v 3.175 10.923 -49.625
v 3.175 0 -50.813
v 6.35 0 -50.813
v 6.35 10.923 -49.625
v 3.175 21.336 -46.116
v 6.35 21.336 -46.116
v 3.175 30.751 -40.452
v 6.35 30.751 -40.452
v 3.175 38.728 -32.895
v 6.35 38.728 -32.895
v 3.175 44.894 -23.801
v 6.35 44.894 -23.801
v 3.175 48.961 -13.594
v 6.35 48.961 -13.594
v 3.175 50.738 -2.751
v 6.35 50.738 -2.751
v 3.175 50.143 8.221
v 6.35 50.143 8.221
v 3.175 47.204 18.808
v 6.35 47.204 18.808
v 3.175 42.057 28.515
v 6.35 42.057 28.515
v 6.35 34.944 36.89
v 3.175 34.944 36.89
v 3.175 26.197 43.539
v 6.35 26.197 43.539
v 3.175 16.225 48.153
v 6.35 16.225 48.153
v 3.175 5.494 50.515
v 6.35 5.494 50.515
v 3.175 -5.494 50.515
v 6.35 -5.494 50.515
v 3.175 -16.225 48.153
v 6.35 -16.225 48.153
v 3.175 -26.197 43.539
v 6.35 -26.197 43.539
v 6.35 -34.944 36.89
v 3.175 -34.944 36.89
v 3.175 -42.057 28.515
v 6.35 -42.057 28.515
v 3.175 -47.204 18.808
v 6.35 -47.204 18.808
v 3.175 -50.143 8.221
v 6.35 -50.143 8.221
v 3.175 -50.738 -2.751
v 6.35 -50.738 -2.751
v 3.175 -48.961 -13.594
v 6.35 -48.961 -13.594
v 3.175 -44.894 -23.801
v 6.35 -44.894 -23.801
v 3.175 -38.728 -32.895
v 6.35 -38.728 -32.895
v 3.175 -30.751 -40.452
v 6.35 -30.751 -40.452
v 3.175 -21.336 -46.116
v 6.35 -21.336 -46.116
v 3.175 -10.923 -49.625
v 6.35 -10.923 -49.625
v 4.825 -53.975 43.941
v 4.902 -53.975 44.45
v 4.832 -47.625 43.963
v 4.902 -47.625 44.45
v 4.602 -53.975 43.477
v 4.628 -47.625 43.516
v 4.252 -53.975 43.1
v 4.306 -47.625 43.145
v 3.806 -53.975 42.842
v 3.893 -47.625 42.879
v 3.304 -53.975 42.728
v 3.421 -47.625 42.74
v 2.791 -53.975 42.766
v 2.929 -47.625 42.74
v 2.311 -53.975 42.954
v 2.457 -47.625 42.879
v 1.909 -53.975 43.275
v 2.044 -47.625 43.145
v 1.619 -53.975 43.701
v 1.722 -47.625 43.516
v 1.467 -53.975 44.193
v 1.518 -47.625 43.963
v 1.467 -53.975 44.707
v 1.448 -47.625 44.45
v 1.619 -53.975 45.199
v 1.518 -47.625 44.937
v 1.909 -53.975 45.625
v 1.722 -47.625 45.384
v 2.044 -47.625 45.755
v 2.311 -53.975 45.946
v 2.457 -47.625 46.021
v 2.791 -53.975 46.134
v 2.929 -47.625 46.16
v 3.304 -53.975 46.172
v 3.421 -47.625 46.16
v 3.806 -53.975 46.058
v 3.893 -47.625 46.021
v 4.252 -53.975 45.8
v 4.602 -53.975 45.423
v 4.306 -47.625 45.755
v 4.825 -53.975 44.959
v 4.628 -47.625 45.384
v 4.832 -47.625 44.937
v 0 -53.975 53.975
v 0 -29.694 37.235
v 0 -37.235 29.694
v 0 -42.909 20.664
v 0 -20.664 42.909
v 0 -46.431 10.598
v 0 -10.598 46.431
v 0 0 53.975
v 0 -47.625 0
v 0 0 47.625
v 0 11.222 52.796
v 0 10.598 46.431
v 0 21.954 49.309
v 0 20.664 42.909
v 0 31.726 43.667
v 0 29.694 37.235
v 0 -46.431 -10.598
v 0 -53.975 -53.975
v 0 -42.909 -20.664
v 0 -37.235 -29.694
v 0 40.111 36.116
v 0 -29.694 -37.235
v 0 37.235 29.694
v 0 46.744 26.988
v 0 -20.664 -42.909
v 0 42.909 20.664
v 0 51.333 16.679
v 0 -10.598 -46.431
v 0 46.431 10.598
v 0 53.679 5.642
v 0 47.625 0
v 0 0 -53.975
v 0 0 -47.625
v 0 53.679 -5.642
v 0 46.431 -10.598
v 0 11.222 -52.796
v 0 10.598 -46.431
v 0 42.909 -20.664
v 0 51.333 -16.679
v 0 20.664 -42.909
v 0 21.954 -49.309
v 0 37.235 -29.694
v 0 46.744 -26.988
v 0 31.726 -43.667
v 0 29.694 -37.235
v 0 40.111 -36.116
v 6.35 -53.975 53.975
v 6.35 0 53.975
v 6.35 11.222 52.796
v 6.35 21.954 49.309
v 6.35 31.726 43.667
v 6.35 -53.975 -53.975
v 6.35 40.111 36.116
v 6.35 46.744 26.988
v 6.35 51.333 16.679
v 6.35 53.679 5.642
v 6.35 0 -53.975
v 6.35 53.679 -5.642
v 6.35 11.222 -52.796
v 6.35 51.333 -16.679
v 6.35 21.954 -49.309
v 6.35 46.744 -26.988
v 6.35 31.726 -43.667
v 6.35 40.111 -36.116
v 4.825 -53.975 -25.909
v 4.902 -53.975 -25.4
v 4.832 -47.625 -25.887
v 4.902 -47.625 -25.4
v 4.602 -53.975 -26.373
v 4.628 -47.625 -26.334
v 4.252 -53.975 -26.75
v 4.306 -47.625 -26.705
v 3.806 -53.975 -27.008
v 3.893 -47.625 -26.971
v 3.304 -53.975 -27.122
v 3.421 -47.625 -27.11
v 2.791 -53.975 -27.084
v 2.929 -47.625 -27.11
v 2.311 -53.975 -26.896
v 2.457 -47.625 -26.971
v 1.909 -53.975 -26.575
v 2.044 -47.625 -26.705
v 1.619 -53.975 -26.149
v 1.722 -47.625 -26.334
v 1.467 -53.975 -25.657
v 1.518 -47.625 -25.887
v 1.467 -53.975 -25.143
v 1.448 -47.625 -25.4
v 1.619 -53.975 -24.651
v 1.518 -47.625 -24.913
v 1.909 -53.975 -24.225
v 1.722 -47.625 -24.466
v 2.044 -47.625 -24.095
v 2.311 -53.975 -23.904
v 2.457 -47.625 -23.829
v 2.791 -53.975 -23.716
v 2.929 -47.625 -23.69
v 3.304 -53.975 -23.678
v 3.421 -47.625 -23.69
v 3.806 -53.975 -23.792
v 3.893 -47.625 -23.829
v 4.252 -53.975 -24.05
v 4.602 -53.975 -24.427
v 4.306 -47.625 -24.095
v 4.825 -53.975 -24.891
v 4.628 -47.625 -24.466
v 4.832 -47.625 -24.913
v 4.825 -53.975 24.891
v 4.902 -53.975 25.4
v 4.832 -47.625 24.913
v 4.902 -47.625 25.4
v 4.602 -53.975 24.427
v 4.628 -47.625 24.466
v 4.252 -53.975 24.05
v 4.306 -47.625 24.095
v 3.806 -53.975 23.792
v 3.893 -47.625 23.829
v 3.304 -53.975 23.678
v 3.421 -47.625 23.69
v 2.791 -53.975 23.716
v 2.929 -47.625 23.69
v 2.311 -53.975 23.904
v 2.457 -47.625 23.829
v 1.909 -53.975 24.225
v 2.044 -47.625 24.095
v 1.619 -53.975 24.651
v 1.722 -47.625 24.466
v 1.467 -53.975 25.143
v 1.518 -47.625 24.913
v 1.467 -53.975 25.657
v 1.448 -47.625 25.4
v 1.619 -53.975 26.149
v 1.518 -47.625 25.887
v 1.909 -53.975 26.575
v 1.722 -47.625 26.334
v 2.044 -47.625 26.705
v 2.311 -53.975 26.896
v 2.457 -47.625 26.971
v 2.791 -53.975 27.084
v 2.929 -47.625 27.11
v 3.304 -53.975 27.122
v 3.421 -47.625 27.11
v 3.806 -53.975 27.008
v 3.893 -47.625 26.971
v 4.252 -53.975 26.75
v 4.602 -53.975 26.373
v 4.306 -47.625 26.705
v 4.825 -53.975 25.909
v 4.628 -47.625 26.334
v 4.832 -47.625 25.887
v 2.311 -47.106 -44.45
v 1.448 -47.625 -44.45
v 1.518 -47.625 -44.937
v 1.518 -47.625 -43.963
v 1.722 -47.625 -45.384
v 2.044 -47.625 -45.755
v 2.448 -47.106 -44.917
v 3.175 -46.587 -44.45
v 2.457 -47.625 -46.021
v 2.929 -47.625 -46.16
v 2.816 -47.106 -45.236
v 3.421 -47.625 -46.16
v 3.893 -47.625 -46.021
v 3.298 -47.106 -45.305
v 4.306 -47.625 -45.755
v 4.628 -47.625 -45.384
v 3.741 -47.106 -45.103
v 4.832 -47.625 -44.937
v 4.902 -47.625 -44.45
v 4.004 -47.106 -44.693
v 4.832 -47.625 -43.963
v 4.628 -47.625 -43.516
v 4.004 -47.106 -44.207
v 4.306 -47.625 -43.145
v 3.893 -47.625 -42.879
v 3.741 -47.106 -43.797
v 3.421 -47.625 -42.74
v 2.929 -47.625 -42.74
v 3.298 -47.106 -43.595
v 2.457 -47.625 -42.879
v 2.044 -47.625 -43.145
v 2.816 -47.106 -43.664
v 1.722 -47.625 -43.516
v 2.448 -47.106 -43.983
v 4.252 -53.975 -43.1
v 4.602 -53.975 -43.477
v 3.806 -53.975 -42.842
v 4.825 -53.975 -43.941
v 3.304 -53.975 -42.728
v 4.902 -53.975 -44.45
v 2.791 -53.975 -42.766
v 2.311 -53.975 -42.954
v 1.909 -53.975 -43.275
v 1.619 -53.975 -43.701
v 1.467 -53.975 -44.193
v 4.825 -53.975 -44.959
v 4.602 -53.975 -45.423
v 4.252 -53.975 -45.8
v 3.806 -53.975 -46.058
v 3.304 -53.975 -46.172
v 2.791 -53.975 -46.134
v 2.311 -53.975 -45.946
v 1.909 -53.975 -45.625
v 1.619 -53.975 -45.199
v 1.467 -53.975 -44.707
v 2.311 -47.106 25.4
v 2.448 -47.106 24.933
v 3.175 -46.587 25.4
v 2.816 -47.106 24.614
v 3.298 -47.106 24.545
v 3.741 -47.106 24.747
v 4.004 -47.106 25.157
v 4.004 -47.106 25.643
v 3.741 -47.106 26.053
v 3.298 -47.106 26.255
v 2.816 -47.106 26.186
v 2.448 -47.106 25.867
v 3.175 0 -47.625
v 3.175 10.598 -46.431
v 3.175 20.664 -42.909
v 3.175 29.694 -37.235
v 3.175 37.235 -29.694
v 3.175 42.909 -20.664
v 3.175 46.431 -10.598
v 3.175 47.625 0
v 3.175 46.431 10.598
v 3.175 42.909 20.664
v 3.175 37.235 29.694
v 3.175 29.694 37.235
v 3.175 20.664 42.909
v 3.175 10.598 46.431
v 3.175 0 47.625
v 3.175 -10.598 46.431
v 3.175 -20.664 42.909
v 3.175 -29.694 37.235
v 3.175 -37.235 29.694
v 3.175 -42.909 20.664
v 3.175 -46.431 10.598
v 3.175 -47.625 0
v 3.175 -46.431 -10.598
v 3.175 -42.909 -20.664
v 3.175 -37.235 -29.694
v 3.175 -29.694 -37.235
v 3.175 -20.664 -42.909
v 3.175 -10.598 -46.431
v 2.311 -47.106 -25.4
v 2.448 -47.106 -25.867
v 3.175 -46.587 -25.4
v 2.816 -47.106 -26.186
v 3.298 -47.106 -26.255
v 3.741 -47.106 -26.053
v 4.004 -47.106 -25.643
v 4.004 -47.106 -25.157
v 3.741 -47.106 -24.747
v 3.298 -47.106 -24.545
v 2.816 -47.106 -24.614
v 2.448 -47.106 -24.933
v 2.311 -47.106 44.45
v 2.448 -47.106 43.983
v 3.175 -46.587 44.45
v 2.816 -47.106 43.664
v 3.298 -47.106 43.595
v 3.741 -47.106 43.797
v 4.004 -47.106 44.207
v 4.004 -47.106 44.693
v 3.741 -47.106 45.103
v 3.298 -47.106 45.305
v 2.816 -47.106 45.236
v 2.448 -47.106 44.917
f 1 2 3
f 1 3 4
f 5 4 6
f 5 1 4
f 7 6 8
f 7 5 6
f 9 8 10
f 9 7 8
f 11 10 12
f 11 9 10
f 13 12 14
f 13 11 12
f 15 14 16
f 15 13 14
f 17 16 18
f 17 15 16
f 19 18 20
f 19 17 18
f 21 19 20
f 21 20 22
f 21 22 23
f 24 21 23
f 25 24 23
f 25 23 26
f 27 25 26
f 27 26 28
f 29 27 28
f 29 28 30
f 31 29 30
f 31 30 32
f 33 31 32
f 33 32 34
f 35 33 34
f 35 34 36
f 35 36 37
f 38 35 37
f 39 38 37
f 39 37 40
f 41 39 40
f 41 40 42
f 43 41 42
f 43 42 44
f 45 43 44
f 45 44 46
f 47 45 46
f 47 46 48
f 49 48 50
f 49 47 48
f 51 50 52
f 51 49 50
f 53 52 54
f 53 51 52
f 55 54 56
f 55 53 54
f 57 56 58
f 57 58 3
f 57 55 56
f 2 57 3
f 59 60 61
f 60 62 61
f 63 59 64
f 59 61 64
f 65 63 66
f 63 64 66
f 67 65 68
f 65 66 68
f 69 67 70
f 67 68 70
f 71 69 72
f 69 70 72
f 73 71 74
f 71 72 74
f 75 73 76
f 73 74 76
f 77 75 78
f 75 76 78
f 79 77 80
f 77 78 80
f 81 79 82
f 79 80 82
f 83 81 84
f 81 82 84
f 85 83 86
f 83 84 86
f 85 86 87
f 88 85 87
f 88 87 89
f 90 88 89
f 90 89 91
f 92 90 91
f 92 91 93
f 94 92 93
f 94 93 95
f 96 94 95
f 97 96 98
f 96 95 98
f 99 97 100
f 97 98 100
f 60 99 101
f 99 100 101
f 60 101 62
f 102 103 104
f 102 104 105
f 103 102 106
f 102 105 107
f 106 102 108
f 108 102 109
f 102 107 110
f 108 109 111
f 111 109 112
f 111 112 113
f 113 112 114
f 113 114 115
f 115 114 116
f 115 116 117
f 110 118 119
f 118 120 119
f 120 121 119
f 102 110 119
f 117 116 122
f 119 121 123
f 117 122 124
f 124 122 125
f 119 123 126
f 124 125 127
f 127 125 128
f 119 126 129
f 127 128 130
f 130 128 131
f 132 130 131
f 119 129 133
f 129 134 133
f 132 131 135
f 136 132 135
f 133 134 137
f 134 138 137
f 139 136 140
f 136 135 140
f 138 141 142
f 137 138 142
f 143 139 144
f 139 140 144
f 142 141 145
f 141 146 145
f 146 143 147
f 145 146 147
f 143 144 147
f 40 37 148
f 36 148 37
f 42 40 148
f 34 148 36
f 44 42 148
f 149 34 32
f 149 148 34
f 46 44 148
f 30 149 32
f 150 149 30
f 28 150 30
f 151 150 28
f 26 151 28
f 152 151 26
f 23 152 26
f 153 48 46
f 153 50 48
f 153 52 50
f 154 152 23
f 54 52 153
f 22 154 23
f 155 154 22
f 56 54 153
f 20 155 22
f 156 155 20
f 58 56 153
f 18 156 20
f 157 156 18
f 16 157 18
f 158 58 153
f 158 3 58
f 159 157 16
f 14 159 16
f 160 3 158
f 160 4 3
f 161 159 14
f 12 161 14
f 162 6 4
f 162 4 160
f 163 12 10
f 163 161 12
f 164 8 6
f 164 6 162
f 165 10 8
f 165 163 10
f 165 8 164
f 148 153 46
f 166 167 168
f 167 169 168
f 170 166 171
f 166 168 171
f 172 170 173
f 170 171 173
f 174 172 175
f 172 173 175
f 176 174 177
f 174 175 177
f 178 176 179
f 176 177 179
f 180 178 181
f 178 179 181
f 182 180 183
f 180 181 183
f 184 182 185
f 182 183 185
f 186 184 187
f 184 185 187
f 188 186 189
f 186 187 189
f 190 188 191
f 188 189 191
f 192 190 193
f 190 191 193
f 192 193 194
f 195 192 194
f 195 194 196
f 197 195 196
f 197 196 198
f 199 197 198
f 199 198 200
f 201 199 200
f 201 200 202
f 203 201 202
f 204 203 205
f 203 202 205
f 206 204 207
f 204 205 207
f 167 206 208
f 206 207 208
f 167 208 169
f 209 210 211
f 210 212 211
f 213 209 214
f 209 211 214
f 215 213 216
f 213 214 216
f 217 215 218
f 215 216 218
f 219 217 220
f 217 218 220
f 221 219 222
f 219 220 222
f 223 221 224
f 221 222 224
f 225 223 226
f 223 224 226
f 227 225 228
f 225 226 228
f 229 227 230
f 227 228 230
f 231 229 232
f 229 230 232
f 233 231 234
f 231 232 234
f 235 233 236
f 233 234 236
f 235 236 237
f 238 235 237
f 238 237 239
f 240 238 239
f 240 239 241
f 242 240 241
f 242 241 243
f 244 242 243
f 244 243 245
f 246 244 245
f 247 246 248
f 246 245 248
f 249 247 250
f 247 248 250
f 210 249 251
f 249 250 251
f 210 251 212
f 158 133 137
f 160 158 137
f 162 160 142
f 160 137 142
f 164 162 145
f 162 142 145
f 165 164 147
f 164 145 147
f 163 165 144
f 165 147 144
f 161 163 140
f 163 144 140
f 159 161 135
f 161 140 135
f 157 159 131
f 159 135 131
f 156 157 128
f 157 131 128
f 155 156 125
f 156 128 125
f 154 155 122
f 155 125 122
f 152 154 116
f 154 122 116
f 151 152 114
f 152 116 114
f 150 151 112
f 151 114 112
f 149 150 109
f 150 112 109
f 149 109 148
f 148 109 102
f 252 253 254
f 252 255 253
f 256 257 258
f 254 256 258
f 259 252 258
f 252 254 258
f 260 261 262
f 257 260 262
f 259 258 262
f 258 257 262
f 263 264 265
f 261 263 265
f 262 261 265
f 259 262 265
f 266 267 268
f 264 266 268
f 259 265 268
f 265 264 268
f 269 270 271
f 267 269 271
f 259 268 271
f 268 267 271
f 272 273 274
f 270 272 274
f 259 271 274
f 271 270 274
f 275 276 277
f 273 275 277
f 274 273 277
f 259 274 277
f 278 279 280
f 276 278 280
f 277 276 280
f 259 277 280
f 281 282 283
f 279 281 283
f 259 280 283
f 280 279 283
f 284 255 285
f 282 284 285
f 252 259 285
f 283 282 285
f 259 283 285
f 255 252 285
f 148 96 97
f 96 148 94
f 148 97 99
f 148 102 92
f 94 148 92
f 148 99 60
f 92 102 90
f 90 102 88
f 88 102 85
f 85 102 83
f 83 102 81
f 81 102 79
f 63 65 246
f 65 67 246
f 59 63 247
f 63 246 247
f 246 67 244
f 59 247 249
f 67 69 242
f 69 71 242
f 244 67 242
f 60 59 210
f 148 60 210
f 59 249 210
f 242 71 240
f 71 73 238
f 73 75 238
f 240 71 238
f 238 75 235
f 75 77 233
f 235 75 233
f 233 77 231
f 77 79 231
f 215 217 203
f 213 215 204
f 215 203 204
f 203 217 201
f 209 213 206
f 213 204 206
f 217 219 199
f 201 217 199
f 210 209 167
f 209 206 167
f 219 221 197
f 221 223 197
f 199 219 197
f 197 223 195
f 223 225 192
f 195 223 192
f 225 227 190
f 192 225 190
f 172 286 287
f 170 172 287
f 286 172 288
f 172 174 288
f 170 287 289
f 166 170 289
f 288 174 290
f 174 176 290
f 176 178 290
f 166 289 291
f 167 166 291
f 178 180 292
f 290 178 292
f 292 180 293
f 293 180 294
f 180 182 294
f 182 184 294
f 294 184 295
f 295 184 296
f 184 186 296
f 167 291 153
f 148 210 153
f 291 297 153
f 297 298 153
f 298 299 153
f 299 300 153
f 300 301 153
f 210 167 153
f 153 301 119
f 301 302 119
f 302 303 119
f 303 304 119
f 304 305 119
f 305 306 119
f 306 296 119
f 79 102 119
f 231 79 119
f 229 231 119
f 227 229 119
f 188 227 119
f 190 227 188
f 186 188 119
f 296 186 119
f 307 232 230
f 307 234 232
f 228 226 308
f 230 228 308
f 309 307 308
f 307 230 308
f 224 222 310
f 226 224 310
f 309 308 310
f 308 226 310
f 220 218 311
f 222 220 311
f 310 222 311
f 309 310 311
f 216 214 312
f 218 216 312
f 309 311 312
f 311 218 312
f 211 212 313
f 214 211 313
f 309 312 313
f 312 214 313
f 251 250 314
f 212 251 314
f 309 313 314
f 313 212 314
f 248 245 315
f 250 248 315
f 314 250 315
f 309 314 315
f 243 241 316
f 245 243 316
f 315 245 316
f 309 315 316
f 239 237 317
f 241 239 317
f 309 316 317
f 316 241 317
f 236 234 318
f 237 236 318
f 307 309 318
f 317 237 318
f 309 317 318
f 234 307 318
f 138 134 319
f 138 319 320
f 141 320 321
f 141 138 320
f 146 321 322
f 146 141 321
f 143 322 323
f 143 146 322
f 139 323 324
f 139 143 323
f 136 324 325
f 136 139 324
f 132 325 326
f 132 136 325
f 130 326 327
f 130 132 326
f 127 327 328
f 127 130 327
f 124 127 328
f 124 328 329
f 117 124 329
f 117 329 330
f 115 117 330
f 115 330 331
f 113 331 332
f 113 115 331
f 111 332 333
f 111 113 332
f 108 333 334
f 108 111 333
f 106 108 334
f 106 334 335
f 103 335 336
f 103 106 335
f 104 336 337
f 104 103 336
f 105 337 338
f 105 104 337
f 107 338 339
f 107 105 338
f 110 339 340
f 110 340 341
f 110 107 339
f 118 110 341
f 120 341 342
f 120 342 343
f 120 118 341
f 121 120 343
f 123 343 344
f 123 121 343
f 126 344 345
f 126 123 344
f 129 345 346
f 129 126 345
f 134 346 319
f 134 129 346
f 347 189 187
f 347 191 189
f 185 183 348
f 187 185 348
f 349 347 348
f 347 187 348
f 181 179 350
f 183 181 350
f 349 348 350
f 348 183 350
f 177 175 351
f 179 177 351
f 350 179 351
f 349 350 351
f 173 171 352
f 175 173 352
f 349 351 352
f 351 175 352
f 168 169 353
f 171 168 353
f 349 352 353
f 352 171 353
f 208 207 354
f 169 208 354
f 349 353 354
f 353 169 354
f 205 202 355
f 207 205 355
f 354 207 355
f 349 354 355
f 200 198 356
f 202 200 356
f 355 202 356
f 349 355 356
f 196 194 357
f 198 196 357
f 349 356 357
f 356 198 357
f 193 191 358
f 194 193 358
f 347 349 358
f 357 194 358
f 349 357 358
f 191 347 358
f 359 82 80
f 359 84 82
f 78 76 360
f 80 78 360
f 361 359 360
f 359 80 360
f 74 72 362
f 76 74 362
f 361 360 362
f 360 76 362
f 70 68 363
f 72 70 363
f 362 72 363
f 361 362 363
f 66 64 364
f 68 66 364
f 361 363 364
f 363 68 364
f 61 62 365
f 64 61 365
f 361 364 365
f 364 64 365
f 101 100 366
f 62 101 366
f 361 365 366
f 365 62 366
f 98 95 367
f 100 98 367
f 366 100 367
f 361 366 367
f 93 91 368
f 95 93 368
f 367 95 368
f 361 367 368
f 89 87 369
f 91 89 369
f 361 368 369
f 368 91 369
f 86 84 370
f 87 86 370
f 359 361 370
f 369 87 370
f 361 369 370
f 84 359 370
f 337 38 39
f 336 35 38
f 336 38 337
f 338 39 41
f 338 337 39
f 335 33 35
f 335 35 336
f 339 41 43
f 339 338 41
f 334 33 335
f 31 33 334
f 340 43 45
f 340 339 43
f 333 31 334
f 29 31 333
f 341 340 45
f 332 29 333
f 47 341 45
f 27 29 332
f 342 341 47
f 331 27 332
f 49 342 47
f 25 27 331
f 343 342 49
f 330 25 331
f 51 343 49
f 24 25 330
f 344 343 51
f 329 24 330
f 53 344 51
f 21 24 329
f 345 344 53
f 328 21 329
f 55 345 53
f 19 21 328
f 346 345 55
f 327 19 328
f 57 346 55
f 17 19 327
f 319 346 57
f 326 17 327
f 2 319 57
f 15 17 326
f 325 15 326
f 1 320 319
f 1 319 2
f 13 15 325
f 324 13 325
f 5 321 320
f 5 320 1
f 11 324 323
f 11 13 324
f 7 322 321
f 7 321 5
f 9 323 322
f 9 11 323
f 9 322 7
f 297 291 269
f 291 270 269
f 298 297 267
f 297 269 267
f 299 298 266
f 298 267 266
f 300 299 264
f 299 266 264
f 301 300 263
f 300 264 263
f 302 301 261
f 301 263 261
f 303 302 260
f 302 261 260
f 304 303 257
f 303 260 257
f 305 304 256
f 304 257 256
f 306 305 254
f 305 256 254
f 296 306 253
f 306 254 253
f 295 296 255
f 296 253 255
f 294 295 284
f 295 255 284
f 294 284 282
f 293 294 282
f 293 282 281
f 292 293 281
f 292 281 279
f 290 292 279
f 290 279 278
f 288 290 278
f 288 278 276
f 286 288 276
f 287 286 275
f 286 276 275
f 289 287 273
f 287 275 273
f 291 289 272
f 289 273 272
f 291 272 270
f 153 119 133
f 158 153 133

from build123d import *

# Parameters (mm, degrees)
SKETCH1_R                 = 50.8127
BOSS_EXTRUDE1_DEPTH       = 6.35
SKETCH1_3_R               = 50.8127
SKETCH1_3_R_2             = 47.625
BOSS_EXTRUDE2_DEPTH       = 3.175
F_8_32_TAPPED_HOLE3_D     = 3.4544
F_8_32_TAPPED_HOLE3_DEPTH = 6.35
F_8_32_TAPPED_HOLE3_TIP   = 1.037806461


with BuildPart() as part:
    # Sketch1 → Boss-Extrude1 (new body)
    with BuildSketch(Plane(origin=(0, 0, 0), x_dir=(0, 0, -1), z_dir=(1, 0, 0))):
        with BuildLine():
            Line((53.975, -53.975), (53.975, 0))
            ThreePointArc((53.975, 0), (0, 53.975), (-53.975, 0))
            Line((-53.975, 0), (-53.975, -53.975))
            Line((-53.975, -53.975), (53.975, -53.975))
        make_face()
        Circle(SKETCH1_R, mode=Mode.SUBTRACT)
    extrude(amount=BOSS_EXTRUDE1_DEPTH)

    # Sketch1<3> → Boss-Extrude2 (add)
    with BuildSketch(Plane(origin=(0, 0, 0), x_dir=(0, 0, -1), z_dir=(1, 0, 0))):
        Circle(SKETCH1_3_R)
        Circle(SKETCH1_3_R_2, mode=Mode.SUBTRACT)
    extrude(amount=BOSS_EXTRUDE2_DEPTH)

    # #8-32 Tapped Hole3
    with Locations(Plane(origin=(0, -53.975, 0), x_dir=(-1, 0, 0), z_dir=(0, -1, 0))):
        with Locations((-3.175, 44.45), (-3.175, 25.4), (-3.175, -25.4), (-3.175, -44.45)):
            Hole(F_8_32_TAPPED_HOLE3_D / 2, depth=F_8_32_TAPPED_HOLE3_DEPTH)
            with Locations((0, 0, -(F_8_32_TAPPED_HOLE3_DEPTH + F_8_32_TAPPED_HOLE3_TIP / 2))):  # 118° drill point
                Cone(0, F_8_32_TAPPED_HOLE3_D / 2, F_8_32_TAPPED_HOLE3_TIP, mode=Mode.SUBTRACT)


solid = part.part
